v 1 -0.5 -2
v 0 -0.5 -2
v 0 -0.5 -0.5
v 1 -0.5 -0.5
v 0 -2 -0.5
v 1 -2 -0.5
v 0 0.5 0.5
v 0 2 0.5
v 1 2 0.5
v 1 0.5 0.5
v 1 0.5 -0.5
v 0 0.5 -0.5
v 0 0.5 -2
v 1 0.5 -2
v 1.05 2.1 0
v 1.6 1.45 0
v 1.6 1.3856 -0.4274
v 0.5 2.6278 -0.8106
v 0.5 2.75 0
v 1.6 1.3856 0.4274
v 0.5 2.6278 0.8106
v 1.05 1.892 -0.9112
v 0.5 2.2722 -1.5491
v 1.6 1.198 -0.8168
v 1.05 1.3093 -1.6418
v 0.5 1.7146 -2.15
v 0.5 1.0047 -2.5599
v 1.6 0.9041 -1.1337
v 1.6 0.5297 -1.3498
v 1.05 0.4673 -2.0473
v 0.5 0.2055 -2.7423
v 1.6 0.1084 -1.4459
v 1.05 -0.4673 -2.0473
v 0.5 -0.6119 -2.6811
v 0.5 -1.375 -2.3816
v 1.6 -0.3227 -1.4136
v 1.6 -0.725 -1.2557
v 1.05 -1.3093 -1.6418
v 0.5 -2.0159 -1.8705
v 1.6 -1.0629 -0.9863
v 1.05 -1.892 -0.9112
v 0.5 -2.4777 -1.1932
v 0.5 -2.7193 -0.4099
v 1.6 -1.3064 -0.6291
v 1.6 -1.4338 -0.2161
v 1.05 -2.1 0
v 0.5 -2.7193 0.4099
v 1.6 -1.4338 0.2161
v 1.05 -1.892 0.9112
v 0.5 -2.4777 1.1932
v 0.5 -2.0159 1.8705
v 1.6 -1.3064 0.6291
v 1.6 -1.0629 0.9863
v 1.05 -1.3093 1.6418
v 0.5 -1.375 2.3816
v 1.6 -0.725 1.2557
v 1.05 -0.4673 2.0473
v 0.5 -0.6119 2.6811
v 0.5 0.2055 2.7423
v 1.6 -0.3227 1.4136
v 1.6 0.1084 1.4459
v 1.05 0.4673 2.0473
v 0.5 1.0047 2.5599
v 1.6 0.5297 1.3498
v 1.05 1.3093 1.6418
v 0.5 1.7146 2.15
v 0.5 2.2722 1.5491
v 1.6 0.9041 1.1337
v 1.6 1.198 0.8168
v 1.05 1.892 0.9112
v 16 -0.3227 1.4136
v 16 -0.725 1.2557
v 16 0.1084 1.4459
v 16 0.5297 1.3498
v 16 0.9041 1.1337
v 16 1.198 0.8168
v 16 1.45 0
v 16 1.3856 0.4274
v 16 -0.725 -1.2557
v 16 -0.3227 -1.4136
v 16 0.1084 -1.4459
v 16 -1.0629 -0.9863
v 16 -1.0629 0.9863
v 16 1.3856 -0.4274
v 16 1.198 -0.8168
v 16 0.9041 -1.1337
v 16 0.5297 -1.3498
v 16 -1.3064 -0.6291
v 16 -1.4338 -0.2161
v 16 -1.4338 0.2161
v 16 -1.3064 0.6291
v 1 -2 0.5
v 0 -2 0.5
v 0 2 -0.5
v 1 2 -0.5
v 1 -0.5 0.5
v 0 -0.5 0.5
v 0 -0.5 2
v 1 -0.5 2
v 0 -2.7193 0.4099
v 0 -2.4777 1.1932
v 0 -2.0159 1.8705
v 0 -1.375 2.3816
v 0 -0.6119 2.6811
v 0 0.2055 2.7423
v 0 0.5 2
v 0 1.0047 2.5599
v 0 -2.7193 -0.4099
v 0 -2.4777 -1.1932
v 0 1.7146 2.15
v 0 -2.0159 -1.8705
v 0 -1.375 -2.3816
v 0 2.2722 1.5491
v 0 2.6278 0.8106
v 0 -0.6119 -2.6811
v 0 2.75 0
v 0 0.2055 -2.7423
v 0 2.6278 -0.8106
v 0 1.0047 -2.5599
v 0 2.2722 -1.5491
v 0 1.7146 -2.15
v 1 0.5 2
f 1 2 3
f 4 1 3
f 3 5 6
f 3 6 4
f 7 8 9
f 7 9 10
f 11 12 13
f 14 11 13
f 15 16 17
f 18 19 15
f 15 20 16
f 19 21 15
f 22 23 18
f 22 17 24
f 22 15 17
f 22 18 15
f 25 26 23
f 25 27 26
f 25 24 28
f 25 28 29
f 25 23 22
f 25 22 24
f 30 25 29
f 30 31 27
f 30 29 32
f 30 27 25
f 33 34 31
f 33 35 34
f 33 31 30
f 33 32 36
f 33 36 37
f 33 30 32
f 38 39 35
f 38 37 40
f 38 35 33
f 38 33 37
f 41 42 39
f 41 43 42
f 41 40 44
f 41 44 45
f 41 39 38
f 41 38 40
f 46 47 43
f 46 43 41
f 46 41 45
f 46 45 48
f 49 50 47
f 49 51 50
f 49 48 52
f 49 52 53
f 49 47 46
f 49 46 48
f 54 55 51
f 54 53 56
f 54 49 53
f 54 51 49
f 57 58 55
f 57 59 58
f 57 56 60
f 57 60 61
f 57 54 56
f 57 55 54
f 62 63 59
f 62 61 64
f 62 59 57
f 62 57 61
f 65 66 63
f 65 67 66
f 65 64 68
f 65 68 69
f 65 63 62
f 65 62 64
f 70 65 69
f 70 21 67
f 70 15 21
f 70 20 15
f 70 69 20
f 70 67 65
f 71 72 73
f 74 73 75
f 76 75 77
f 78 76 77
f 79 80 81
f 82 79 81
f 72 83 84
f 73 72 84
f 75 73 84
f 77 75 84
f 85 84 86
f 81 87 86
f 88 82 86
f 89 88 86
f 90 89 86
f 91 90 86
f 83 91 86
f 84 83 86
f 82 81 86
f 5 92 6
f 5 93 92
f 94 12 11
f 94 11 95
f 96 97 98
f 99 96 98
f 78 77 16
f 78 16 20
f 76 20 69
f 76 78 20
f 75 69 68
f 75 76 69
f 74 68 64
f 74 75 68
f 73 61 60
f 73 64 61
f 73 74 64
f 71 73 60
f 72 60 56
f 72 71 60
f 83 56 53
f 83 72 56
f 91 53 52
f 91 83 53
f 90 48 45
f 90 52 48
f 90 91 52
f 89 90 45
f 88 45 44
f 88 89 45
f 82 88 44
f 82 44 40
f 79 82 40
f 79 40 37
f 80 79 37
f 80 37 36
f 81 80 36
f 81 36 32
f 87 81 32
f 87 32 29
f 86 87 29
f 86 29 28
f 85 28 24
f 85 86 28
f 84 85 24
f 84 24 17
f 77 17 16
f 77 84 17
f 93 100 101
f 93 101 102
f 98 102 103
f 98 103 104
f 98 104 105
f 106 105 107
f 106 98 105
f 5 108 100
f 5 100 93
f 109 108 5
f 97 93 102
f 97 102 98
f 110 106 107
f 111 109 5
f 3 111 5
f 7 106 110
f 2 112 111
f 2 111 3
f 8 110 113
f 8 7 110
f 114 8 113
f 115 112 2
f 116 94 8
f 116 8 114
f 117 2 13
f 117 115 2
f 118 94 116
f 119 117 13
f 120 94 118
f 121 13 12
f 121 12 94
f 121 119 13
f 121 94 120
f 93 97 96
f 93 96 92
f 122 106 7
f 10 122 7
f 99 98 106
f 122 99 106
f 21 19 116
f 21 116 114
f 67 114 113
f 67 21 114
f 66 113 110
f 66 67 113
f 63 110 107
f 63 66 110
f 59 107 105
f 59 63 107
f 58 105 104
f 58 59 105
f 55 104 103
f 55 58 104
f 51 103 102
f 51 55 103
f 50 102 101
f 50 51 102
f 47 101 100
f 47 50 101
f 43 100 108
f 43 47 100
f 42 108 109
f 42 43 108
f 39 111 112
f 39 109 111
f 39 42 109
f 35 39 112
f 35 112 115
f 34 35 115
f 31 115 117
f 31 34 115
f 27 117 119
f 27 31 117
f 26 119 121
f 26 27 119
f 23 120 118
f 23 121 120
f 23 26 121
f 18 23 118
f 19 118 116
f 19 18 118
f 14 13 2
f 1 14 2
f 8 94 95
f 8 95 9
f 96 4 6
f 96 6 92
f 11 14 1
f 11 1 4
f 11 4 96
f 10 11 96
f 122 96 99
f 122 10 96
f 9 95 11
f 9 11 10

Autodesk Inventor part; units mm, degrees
ref_plane "YZ Plane" through (0, 0, 0) normal (1, 0, 0) x (0, 1, 0)
ref_plane "XZ Plane" through (0, 0, 0) normal (0, 1, 0) x (-1, 0, 0)
ref_plane "XY Plane" through (0, 0, 0) normal (0, 0, 1) x (1, 0, 0)
sketch "Эскиз4" plane through (0, 0, 0) normal (0, 0, 1) x (1, 0, 0)
  line L0 (0, 0) -> (0, 2.75)
  line L1 (1.6, 1.45) -> (16, 1.45)
  line L2 (16, 1.45) -> (16, 0)
  line L3 (16, 0) -> (0, 0)
  line L4 (0, 2.75) -> (0.5, 2.75)
  line L5 (0.5, 2.75) -> (1.6, 1.45)
  dimension "d14" = 16
  dimension "d15" = 1.45
  dimension "d17" = 2.75
  dimension "d18" = 0.5
  dimension "d19" = 1.6
revolve "Вращение1" add sketch "Эскиз4" angle 360 about axis through (16, 0, 0) along (-1, 0, 0)
thread "Резьба2" size "M3x0.5" class "6g" standard "ANSI Metric M Profile" full length
sketch "Эскиз5" plane through (0, 0, 0) normal (-1, 0, 0) x (0, 0, 1)
  line L0 (0.5, -2) -> (-0.5, -2)
  line L1 (-0.5, -2) -> (-0.5, 2)
  line L2 (-0.5, 2) -> (0.5, 2)
  line L3 (0.5, 2) -> (0.5, -2)
  line L4 (0.5, -2) -> (-0.5, 2) construction
  line L5 (-0.5, -2) -> (0.5, 2) construction
  line L6 (-2, -0.5) -> (2, -0.5)
  line L7 (2, -0.5) -> (2, 0.5)
  line L8 (2, 0.5) -> (-2, 0.5)
  line L9 (-2, 0.5) -> (-2, -0.5)
  circle A0 centre (0, 0) radius 2.75 projected
  line L10 (-2, -0.5) -> (2, 0.5) construction
  line L11 (2, -0.5) -> (-2, 0.5) construction
  point P0 (-0.5, 0.5)
  point P1 (-0.5, -0.5)
  point P2 (0.5, -0.5)
  point P3 (0.5, 0.5)
  dimension "d23" = 1
  dimension "d24" = 4
extrude "Выдавливание4" cut sketch "Эскиз5" against normal blind 1 contours L0 L1 L6 L3 | L6 L1 L8 L3 | L3 L8 L7 L6 | L6 L9 L8 L1 | L8 L1 L2 L3
properties part number "Болт М3х15"
